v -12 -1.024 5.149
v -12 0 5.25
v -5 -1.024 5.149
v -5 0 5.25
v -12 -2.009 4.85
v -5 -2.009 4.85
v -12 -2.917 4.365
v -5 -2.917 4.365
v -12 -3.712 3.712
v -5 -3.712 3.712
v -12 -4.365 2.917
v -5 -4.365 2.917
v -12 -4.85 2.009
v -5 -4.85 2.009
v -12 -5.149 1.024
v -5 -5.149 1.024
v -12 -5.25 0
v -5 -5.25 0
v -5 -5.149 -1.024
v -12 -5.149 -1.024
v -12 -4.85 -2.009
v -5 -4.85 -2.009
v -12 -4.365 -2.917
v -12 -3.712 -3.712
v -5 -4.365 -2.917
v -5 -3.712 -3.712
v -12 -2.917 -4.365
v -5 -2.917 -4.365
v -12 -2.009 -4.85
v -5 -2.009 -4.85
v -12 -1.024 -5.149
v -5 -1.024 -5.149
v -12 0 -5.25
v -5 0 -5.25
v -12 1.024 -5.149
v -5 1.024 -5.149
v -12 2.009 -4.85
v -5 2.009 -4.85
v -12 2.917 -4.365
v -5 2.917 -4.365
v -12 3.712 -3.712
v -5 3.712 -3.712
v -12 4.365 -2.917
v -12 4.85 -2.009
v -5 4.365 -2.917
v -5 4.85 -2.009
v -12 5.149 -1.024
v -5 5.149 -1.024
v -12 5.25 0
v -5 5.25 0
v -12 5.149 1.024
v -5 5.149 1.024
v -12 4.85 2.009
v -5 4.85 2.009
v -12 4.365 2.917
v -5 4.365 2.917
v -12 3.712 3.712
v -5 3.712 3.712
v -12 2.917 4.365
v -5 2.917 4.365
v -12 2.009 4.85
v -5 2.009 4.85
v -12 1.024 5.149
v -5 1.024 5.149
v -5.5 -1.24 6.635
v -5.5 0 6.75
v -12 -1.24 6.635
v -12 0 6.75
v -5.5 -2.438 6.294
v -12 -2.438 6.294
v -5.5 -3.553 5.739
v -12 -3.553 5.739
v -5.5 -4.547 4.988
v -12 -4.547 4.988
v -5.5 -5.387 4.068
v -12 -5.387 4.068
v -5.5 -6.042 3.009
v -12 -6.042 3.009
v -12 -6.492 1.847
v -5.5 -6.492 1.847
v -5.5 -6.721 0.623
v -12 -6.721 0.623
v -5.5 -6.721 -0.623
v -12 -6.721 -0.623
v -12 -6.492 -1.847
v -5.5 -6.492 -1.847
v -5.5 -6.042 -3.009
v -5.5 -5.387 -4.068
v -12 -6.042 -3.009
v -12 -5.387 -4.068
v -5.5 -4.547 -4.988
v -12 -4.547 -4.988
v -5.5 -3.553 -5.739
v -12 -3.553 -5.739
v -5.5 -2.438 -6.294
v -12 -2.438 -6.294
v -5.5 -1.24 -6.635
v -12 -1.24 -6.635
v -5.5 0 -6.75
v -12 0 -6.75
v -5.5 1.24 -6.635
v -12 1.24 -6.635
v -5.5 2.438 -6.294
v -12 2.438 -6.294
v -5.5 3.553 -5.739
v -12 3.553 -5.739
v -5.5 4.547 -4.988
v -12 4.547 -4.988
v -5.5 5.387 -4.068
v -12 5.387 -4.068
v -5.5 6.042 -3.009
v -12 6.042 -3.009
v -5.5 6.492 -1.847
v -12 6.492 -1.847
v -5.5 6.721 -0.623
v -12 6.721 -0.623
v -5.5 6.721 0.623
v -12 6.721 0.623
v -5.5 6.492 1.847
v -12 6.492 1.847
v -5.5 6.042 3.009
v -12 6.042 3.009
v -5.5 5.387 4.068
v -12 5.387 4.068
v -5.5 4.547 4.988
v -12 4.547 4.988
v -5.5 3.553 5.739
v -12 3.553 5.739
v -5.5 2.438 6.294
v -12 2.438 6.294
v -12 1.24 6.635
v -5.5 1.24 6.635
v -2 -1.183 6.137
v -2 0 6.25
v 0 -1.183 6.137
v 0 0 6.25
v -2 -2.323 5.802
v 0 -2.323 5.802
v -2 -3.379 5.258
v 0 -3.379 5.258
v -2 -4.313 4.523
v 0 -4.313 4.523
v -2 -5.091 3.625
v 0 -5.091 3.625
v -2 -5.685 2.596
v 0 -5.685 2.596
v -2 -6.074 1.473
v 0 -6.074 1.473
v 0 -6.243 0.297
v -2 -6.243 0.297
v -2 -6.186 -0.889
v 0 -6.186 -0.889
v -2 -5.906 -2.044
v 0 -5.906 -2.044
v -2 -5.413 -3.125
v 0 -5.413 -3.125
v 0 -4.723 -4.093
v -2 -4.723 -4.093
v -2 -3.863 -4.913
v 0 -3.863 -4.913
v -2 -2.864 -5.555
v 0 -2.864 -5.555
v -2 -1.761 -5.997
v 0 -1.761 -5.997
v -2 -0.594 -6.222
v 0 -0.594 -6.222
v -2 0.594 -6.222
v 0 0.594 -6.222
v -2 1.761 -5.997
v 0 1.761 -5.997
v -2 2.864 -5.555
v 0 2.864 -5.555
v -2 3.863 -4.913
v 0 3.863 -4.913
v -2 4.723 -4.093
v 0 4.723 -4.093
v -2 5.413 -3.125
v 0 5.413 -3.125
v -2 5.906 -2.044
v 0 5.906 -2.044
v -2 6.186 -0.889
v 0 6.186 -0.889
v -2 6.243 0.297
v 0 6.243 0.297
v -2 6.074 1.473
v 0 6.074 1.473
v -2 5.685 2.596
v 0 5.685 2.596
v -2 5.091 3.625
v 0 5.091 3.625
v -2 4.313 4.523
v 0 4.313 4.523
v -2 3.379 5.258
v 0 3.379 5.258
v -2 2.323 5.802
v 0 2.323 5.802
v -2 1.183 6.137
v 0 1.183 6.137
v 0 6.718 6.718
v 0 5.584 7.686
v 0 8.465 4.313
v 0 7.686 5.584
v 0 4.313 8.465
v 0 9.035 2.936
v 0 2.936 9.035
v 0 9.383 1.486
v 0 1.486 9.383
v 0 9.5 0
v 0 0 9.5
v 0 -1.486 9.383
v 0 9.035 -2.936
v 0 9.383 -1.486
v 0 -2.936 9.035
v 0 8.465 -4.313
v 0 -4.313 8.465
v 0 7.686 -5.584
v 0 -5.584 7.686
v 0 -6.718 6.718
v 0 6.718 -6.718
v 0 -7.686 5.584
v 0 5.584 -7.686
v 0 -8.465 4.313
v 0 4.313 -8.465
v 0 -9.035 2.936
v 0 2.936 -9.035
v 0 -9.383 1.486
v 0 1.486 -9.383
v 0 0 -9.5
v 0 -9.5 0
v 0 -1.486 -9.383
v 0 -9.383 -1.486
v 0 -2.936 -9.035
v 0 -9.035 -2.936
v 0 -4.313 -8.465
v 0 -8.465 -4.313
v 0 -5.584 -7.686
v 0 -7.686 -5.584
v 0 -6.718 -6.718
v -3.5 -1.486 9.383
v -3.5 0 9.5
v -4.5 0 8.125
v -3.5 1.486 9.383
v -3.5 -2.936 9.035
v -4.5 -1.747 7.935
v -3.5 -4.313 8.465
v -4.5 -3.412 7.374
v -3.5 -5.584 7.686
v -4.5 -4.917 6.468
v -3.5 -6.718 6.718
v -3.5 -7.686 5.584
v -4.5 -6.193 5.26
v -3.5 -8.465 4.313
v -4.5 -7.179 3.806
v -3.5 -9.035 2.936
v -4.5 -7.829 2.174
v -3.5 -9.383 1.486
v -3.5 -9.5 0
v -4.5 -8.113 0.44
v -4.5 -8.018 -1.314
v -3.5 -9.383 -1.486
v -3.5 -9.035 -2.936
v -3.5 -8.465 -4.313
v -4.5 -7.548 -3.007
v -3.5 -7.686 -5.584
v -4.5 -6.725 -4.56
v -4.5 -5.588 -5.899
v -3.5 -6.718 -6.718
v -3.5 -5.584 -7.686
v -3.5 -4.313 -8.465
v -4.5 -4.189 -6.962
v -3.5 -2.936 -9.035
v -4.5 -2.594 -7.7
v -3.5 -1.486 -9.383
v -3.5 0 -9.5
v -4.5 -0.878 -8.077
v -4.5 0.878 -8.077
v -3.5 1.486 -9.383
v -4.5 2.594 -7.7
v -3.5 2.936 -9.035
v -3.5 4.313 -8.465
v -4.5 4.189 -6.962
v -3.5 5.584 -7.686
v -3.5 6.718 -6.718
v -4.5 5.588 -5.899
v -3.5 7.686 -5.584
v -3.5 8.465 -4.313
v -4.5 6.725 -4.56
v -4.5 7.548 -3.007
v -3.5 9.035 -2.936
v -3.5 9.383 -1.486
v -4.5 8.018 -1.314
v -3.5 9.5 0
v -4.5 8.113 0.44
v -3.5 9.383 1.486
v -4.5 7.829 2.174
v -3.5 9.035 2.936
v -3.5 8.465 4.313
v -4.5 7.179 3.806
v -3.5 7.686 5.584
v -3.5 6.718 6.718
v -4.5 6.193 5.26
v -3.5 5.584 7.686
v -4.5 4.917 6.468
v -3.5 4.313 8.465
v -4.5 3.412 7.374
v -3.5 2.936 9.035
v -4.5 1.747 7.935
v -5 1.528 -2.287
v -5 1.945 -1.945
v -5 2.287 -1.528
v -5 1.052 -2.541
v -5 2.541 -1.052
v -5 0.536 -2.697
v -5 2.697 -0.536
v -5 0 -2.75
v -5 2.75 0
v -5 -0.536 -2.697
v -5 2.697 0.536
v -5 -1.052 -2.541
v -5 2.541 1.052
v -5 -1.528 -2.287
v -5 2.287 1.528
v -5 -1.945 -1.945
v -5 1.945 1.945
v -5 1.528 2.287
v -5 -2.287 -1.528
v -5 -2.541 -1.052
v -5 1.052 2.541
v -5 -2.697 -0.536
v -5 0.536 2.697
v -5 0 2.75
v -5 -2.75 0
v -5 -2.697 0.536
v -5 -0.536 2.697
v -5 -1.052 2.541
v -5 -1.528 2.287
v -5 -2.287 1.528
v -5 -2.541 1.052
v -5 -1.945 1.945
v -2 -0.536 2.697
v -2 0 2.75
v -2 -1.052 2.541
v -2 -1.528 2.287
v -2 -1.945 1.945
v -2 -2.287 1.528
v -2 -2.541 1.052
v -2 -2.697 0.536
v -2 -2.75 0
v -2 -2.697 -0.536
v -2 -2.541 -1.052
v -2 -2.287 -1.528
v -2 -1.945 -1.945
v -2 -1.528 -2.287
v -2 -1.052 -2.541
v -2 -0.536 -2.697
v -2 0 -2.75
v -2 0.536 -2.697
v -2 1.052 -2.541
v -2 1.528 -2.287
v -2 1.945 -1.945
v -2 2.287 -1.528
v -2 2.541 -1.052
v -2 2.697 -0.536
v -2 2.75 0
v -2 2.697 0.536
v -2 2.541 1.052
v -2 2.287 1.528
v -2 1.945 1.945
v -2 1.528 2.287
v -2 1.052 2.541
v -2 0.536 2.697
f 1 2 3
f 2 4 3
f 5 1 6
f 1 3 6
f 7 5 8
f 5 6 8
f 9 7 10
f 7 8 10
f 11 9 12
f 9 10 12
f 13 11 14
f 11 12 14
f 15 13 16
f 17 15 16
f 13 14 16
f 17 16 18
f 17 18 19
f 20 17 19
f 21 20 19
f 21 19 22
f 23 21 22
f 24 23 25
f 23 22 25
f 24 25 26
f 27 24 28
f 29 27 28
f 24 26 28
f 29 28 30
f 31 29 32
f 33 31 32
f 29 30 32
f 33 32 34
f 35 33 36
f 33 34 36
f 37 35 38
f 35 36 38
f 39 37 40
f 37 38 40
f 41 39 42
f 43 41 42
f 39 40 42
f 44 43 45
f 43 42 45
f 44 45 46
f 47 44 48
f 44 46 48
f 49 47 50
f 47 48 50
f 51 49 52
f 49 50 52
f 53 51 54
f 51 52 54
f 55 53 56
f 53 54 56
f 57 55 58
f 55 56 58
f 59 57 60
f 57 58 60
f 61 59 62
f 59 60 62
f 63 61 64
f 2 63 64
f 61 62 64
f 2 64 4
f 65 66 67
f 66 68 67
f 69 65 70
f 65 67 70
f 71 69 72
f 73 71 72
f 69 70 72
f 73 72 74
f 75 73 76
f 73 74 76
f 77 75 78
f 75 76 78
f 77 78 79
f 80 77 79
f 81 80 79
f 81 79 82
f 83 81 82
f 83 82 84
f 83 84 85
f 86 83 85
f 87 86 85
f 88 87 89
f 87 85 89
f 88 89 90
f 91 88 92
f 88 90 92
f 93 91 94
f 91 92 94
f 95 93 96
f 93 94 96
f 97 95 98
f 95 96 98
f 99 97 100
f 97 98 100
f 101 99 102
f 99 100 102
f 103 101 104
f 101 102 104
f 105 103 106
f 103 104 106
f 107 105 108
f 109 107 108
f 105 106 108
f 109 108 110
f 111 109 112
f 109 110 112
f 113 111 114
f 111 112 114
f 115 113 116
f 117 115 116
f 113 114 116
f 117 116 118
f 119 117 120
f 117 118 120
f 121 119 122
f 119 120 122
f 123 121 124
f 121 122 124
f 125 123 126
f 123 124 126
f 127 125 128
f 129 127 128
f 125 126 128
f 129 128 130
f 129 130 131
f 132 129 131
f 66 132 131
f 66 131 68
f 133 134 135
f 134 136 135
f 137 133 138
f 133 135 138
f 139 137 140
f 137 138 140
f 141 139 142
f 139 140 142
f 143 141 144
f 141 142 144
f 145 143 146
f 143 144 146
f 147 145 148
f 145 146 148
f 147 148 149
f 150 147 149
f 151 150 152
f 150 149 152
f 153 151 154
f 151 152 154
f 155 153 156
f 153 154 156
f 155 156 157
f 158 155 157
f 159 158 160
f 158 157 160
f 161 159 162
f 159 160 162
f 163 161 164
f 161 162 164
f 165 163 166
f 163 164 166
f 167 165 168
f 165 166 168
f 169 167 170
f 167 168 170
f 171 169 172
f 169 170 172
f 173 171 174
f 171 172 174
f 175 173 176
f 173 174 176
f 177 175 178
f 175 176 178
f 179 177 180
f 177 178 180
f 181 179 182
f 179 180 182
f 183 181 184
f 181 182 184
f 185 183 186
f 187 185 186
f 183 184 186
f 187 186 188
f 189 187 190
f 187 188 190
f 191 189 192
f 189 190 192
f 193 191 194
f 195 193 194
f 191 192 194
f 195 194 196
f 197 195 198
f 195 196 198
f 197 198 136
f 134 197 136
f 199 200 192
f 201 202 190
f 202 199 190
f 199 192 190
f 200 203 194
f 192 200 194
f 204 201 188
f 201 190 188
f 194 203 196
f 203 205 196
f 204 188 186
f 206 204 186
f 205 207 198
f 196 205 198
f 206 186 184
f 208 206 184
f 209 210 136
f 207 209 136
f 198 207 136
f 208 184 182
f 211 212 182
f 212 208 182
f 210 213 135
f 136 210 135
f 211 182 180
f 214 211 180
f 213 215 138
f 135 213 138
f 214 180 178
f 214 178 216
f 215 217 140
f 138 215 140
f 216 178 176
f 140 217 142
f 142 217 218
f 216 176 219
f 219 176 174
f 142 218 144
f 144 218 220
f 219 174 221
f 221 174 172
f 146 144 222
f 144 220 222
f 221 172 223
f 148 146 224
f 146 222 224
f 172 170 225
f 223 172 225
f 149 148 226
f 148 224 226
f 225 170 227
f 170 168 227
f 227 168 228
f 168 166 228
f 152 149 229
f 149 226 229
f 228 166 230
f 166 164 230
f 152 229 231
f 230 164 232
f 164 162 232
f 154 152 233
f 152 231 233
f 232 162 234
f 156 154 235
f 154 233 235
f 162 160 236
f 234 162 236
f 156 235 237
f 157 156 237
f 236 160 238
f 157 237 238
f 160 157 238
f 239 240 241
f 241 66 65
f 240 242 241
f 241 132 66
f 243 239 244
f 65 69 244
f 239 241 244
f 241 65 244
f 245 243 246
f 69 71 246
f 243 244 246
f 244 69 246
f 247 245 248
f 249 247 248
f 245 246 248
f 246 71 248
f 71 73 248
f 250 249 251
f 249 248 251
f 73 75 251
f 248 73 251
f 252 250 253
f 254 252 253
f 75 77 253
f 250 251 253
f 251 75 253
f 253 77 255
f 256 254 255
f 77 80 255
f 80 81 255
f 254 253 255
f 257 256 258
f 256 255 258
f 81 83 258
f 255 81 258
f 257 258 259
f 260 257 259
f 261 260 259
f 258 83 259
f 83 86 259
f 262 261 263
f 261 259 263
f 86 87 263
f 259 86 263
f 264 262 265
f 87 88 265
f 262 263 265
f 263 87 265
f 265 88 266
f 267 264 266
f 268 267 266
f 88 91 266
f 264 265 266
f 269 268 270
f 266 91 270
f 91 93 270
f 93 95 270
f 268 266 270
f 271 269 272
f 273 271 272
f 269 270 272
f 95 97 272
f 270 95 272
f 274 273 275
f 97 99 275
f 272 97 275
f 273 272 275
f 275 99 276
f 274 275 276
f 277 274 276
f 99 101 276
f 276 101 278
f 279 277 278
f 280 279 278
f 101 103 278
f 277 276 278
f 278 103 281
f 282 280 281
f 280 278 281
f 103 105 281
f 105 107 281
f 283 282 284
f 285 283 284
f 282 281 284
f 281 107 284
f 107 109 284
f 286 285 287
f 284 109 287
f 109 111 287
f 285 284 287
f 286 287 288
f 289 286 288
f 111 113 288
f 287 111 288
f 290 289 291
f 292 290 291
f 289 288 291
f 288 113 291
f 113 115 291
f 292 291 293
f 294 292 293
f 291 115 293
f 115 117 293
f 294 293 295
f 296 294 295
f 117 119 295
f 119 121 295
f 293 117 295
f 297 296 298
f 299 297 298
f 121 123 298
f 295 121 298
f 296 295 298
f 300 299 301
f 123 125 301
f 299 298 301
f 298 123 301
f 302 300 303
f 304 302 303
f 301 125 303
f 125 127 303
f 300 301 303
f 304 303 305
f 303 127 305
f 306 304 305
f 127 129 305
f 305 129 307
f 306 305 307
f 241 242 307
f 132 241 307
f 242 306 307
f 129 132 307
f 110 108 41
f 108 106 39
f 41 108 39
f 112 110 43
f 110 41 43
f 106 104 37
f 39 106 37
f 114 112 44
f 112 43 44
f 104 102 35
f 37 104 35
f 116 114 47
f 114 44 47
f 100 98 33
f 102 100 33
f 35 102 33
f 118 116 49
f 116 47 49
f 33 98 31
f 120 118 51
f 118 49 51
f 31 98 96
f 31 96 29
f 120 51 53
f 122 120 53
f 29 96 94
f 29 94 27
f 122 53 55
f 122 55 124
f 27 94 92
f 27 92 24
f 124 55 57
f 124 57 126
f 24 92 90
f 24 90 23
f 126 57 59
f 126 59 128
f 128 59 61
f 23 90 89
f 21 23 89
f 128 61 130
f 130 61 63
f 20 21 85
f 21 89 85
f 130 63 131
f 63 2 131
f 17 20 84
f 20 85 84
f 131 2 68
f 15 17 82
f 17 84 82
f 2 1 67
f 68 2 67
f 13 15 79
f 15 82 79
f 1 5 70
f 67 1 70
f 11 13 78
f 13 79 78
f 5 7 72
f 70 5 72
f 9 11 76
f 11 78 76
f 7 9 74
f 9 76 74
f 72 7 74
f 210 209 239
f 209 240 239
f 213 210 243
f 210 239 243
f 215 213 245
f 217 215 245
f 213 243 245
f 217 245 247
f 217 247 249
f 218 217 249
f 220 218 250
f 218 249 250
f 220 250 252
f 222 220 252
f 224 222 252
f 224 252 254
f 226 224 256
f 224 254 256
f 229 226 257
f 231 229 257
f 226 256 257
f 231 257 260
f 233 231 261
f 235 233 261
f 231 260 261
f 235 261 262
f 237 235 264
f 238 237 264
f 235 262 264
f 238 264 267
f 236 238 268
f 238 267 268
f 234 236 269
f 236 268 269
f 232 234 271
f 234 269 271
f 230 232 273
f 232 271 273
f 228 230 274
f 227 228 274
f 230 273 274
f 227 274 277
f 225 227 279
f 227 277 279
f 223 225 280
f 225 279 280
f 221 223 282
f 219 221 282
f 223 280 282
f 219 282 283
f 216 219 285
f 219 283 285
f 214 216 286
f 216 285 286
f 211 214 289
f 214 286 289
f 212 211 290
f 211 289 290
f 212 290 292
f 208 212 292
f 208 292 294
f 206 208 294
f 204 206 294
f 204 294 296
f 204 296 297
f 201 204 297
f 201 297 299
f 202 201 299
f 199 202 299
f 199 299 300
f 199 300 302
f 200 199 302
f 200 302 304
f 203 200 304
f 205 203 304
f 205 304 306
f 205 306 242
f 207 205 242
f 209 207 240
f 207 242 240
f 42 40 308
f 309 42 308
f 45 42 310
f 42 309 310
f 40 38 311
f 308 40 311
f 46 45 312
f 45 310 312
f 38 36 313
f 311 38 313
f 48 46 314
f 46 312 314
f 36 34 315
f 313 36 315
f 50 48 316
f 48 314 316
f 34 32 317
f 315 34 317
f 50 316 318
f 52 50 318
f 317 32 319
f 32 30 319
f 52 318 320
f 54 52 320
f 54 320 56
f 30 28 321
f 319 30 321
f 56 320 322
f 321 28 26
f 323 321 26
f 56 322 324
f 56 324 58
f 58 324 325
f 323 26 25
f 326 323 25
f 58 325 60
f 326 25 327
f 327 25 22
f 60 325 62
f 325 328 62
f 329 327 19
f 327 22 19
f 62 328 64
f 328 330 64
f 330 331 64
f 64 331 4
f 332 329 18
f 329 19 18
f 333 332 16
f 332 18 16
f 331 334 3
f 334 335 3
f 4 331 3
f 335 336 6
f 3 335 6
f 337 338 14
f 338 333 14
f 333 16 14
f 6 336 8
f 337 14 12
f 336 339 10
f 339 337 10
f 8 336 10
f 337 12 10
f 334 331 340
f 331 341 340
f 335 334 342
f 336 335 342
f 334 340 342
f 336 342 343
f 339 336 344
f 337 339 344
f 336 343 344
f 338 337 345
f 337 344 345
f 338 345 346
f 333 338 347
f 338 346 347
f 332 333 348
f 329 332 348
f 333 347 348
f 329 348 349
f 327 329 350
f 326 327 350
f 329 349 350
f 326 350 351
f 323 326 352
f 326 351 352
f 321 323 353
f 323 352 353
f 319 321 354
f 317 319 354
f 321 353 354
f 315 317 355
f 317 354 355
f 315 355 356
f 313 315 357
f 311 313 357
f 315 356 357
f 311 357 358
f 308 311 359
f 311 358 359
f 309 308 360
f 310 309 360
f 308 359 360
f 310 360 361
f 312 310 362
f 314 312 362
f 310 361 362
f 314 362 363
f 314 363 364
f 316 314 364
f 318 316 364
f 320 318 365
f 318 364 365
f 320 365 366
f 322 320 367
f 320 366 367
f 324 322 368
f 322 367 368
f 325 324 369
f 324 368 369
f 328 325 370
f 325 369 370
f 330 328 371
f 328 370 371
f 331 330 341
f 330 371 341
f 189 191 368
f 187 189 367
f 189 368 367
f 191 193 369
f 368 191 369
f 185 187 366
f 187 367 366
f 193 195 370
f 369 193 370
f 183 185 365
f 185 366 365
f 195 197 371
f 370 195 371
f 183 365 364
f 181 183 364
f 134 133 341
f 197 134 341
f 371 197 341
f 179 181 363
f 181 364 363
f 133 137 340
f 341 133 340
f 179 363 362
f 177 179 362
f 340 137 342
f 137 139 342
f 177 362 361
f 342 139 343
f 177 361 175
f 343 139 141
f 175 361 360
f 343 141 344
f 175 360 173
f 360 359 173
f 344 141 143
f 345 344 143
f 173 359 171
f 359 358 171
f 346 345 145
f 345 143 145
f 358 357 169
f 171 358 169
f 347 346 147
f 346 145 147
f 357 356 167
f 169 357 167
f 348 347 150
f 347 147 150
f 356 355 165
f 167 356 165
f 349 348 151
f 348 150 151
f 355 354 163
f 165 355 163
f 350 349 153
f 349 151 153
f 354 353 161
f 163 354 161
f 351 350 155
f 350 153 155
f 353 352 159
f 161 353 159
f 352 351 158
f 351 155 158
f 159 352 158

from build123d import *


with BuildPart() as part:
    # Esquisse1 → Révolution1 (revolve)
    with BuildSketch(Plane.XY, mode=Mode.PRIVATE) as r_volution1_sk:
        Polygon((-5, 2.75), (-2, 2.75), (-2, 6.25), (0, 6.25), (0, 9.5), (-3.5, 9.5), (-5.5, 6.75), (-12, 6.75), (-12, 5.25), (-5, 5.25), align=None)
    revolve(r_volution1_sk.sketch.rotate(Axis((-19.911160568, 0, 0), (1, 0, 0)), 90), axis=Axis((-19.911160568, 0, 0), (1, 0, 0)))  # turned: the seam where the file's is


solid = part.part
